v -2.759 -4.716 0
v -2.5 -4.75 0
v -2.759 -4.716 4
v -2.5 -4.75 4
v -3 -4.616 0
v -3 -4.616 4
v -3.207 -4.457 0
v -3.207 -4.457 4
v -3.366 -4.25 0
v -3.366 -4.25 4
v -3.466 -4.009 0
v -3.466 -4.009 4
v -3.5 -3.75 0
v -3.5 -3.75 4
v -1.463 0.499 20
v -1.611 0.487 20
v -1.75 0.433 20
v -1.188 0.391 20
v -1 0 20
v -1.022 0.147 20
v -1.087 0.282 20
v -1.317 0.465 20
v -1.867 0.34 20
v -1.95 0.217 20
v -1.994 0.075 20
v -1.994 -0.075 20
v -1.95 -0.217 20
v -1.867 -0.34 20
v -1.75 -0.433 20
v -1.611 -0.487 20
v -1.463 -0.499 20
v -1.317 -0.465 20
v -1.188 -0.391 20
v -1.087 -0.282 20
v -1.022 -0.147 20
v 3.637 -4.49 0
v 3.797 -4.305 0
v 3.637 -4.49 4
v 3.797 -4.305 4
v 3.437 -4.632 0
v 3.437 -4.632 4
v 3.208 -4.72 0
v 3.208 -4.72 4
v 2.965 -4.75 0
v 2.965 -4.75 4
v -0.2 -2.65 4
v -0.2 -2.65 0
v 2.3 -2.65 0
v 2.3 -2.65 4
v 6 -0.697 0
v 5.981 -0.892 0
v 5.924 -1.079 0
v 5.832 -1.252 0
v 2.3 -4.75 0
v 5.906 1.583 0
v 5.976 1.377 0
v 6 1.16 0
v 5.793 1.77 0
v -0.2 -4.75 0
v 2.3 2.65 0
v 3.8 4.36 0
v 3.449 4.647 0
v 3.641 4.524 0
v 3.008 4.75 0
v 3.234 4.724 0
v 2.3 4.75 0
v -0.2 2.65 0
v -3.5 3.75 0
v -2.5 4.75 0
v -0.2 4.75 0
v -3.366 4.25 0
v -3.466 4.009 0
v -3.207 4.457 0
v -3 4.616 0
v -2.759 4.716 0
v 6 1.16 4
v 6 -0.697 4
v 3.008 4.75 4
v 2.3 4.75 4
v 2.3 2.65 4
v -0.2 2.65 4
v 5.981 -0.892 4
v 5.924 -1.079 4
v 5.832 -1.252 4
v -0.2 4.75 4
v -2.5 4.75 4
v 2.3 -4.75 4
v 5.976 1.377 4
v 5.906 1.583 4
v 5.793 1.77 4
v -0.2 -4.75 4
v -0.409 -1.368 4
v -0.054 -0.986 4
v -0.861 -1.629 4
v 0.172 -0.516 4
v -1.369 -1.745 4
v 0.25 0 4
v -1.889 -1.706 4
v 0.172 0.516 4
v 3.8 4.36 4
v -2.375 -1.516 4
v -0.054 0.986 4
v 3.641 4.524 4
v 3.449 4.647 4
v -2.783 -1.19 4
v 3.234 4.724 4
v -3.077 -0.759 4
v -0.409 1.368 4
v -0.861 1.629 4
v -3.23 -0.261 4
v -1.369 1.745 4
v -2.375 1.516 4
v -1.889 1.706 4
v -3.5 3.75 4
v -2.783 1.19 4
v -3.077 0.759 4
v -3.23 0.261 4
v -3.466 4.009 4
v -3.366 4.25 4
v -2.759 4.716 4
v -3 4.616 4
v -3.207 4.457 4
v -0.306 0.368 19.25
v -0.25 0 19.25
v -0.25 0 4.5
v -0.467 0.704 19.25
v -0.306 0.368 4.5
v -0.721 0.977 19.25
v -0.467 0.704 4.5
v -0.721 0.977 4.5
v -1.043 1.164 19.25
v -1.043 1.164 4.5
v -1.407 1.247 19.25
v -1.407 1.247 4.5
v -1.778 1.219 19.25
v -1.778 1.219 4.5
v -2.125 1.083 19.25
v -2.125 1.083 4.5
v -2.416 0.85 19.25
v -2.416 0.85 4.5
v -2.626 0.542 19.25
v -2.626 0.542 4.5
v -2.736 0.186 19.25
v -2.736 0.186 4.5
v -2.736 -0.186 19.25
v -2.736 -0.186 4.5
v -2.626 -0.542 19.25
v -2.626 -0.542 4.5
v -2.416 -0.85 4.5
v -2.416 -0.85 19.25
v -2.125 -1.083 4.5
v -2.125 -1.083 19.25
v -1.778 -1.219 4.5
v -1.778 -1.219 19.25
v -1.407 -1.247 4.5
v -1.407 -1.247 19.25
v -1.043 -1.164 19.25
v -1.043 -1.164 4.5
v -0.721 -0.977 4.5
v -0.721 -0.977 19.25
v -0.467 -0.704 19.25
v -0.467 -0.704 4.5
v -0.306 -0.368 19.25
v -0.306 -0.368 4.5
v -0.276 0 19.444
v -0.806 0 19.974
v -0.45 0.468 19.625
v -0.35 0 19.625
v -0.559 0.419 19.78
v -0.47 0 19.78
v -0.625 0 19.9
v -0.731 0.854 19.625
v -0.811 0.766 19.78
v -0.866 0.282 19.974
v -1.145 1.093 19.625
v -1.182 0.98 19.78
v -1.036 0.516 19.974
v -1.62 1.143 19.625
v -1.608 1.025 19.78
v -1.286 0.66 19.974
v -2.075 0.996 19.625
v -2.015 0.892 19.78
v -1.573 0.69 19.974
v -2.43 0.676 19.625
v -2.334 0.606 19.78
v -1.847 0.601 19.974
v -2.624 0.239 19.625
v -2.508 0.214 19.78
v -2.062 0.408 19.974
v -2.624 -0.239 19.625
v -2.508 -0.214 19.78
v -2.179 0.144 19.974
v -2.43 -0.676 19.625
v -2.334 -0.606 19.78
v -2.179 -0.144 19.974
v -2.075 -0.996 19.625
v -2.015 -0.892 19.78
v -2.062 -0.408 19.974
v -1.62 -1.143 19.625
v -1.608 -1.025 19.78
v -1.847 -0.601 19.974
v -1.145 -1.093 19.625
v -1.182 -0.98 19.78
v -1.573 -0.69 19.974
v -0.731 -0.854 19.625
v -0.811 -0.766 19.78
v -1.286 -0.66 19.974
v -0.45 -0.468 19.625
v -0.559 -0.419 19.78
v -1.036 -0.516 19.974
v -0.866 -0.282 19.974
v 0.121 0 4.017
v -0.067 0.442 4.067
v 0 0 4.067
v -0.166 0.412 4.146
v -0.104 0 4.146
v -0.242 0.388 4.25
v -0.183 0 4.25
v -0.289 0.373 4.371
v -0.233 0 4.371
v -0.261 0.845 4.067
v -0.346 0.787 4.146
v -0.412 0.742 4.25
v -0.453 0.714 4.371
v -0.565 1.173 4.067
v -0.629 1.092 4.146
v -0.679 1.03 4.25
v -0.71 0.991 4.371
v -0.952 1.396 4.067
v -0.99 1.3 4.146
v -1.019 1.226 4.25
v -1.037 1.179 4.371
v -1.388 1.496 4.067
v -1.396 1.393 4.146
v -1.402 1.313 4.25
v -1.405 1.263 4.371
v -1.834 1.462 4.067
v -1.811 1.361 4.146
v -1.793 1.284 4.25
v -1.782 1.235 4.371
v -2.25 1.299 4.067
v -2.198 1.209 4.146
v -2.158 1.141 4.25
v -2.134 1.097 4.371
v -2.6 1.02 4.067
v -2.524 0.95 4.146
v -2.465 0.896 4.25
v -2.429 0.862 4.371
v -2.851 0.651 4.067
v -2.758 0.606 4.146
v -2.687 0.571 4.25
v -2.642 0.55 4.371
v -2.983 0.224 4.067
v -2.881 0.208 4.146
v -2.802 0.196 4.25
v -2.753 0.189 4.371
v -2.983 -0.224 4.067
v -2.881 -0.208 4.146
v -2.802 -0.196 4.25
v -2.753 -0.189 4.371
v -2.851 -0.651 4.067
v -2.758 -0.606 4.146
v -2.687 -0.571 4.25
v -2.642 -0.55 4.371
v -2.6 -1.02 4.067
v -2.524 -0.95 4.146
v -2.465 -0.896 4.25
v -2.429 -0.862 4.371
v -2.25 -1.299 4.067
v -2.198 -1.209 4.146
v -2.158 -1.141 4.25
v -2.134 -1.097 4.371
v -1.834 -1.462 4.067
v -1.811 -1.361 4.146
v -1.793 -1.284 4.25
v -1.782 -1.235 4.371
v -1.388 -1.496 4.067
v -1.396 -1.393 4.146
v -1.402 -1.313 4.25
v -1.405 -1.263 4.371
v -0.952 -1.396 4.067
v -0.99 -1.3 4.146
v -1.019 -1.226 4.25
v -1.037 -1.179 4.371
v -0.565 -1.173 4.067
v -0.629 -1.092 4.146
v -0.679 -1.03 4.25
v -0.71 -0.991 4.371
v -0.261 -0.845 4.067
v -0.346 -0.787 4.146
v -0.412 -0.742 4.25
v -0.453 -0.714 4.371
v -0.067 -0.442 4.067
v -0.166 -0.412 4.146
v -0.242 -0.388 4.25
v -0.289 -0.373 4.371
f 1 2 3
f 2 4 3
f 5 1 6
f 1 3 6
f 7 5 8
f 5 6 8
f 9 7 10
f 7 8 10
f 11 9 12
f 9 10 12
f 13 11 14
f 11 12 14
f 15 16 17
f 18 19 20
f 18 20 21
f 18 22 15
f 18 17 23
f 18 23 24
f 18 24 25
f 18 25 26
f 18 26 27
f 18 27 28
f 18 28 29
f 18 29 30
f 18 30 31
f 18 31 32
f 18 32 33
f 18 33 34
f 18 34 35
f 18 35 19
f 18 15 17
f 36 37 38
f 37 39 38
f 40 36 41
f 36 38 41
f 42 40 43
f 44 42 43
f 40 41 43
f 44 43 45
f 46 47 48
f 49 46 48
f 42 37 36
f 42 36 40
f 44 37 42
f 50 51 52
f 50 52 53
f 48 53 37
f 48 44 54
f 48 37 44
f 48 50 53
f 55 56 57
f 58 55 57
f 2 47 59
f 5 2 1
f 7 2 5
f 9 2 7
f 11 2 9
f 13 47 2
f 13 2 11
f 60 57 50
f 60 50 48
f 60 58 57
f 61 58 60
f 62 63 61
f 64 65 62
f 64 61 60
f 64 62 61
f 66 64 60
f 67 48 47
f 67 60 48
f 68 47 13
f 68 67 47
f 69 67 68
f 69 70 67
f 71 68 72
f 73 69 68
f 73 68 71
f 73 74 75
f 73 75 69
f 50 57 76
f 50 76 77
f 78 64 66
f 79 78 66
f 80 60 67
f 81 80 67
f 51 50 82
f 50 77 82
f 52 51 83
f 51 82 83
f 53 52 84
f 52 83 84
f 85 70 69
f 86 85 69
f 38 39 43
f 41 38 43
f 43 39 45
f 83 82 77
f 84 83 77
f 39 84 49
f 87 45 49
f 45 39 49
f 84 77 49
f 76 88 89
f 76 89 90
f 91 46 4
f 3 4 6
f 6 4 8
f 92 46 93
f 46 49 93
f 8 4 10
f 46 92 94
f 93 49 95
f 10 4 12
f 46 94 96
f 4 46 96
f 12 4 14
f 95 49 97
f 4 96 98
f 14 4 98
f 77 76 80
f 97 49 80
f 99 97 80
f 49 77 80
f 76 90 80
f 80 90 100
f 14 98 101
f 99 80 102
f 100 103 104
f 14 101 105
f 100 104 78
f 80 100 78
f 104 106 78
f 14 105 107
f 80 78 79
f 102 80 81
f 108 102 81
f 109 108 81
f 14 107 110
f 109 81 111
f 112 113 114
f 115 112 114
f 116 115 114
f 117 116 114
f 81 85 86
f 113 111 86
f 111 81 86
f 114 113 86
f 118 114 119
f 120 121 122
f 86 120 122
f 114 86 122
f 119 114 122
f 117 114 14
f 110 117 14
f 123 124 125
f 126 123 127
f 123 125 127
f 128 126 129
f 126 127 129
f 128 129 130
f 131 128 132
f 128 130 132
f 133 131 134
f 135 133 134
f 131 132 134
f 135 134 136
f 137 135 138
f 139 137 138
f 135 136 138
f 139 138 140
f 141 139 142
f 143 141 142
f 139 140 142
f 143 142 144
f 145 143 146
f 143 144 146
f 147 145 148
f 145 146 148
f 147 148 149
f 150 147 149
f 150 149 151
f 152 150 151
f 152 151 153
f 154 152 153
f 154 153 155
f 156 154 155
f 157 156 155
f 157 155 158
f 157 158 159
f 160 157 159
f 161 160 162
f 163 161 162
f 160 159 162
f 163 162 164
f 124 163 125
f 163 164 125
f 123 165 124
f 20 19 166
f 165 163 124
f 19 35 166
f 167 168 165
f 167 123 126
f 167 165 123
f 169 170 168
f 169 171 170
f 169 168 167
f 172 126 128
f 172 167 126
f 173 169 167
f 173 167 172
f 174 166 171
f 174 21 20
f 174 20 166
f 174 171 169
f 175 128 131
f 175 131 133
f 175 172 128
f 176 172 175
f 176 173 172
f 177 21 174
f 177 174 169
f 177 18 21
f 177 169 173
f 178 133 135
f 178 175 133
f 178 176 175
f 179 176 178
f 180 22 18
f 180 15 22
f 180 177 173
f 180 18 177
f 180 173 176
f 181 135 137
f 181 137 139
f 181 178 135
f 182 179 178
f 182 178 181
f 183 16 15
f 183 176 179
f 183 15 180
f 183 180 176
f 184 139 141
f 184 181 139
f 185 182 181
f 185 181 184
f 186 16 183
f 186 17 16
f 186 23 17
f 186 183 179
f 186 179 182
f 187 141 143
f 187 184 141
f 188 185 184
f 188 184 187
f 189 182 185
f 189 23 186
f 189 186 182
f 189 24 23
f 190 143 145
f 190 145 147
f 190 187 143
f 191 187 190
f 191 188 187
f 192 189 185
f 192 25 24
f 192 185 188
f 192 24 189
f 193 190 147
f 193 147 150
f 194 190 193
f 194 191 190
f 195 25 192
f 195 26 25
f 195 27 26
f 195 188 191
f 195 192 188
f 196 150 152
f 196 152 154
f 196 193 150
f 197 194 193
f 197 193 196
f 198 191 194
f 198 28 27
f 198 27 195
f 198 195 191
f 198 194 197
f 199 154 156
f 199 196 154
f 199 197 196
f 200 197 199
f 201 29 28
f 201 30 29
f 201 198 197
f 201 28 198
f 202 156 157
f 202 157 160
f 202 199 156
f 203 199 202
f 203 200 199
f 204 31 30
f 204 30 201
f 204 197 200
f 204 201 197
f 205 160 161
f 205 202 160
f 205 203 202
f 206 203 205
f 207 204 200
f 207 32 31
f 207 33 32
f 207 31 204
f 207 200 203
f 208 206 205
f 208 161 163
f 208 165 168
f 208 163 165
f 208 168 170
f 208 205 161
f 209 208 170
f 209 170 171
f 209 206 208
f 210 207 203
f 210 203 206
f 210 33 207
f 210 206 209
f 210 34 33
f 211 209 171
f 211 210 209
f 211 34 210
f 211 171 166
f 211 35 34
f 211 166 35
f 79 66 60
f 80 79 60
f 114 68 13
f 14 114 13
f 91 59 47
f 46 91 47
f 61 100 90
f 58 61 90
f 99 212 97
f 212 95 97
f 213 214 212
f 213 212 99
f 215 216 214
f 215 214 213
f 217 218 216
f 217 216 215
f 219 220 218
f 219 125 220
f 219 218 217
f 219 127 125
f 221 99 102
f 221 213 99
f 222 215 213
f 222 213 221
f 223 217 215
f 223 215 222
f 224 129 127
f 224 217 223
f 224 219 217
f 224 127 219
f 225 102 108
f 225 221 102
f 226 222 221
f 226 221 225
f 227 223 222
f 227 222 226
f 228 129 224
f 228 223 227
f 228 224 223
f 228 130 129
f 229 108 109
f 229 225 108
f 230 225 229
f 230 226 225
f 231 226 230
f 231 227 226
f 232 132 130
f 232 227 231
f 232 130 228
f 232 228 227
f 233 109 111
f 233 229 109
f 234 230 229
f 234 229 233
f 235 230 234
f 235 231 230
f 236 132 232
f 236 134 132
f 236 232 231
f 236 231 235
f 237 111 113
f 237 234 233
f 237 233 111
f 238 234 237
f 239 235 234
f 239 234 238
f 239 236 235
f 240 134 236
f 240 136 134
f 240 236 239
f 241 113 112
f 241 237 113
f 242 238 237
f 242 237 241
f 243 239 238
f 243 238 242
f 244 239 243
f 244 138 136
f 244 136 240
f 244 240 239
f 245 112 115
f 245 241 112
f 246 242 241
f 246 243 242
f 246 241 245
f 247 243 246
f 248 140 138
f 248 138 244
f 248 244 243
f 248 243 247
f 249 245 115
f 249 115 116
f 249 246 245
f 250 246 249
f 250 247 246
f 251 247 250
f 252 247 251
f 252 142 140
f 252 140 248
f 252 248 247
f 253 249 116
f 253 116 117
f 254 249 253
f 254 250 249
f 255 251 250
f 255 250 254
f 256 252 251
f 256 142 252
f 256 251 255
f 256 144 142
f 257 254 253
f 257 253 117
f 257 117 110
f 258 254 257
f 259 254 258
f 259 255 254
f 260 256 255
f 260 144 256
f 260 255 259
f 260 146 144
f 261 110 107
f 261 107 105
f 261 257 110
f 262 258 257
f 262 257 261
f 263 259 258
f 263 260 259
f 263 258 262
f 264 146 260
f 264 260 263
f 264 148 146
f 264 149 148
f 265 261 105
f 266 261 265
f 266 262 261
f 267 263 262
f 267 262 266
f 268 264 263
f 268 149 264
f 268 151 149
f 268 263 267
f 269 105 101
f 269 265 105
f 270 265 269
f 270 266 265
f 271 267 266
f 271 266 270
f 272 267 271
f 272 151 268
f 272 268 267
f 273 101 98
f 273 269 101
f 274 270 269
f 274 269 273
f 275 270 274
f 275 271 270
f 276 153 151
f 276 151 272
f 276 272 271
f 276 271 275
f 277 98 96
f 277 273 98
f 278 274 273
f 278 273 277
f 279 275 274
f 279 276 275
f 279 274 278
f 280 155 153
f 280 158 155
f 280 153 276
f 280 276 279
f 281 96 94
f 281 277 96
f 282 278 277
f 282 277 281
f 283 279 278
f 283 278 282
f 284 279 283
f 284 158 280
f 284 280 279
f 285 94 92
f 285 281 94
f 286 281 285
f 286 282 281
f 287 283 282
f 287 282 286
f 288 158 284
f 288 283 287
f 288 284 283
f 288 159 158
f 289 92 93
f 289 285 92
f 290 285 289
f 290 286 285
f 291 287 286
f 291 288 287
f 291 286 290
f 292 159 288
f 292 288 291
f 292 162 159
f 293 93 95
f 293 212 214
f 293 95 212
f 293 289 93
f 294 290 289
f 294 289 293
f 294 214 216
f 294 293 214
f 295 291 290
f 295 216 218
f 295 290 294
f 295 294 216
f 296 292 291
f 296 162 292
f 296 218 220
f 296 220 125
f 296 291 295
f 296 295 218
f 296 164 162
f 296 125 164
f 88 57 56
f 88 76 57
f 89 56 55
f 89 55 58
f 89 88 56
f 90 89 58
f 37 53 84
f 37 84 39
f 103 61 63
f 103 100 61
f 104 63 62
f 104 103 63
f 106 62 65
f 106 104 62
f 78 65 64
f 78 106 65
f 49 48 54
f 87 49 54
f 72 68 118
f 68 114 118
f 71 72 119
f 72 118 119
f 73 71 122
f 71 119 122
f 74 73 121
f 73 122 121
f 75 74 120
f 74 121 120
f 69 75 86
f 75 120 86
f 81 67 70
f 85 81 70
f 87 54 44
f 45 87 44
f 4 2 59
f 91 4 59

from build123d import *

# Parameters (mm, degrees)
BOSS_EXTRUDE1_DEPTH = 4
BOSS_EXTRUDE2_DEPTH = 4
SKETCH3_R           = 1.25
BOSS_EXTRUDE3_DEPTH = 16
FILLET1_R           = 1
FILLET2_R           = 0.5
FILLET3_R           = 0.75


with BuildPart() as part:
    # Sketch1 → Boss-Extrude1 (new body)
    with BuildSketch(Plane.XY):
        Polygon((2.3, -4.75), (3.5, -4.75), (3.5, 4.75), (2.3, 4.75), (2.3, 2.65), (-0.2, 2.65), (-0.2, 4.75), (-3.5, 4.75), (-3.5, -4.75), (-0.2, -4.75), (-0.2, -2.65), (2.3, -2.65), align=None)
    extrude(amount=BOSS_EXTRUDE1_DEPTH)

    # Sketch2 → Boss-Extrude2 (add)
    with BuildSketch(Plane(origin=(0, 0, 0), x_dir=(-1, 0, 0), z_dir=(0, 0, -1))):
        Polygon((-6, 1.5), (-6, -1), (-3.5, -4.75), (-3.5, 4.75), align=None)
    extrude(amount=-BOSS_EXTRUDE2_DEPTH)

    # Sketch3 → Boss-Extrude3 (add)
    with BuildSketch(Plane.XY.offset(4)):
        with Locations((-1.5, 0)):
            Circle(SKETCH3_R)
    extrude(amount=BOSS_EXTRUDE3_DEPTH)

    # Fillet1
    fillet1_edges = [part.edges().sort_by_distance(p)[0] for p in [
        (-3.5, -4.75, 2),
        (-3.5, 4.75, 2),
        (3.5, 4.75, 2),
        (3.5, -4.75, 2),
        (6, -1, 2),
        (6, 1.5, 2),
    ]]
    fillet(fillet1_edges, radius=FILLET1_R)

    # Fillet2
    fillet2_edges = [part.edges().sort_by_distance(p)[0] for p in [
        (-2.75, 0, 4),
    ]]
    fillet(fillet2_edges, radius=FILLET2_R)

    # Fillet3
    fillet3_edges = [part.edges().sort_by_distance(p)[0] for p in [
        (-2.75, 0, 20),
    ]]
    fillet(fillet3_edges, radius=FILLET3_R)


solid = part.part
